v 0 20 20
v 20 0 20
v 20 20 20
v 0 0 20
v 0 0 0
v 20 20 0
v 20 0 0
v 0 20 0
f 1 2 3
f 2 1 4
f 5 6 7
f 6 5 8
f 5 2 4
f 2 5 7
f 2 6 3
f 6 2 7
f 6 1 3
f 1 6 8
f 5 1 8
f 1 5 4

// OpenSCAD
// The clean version of subfeature_overlap_fail: sub-module A, solo export.

$fa = 2; $fs = 0.3;

// EXPECTED_BBOX: [20, 20, 20]
cube([20, 20, 20]);
